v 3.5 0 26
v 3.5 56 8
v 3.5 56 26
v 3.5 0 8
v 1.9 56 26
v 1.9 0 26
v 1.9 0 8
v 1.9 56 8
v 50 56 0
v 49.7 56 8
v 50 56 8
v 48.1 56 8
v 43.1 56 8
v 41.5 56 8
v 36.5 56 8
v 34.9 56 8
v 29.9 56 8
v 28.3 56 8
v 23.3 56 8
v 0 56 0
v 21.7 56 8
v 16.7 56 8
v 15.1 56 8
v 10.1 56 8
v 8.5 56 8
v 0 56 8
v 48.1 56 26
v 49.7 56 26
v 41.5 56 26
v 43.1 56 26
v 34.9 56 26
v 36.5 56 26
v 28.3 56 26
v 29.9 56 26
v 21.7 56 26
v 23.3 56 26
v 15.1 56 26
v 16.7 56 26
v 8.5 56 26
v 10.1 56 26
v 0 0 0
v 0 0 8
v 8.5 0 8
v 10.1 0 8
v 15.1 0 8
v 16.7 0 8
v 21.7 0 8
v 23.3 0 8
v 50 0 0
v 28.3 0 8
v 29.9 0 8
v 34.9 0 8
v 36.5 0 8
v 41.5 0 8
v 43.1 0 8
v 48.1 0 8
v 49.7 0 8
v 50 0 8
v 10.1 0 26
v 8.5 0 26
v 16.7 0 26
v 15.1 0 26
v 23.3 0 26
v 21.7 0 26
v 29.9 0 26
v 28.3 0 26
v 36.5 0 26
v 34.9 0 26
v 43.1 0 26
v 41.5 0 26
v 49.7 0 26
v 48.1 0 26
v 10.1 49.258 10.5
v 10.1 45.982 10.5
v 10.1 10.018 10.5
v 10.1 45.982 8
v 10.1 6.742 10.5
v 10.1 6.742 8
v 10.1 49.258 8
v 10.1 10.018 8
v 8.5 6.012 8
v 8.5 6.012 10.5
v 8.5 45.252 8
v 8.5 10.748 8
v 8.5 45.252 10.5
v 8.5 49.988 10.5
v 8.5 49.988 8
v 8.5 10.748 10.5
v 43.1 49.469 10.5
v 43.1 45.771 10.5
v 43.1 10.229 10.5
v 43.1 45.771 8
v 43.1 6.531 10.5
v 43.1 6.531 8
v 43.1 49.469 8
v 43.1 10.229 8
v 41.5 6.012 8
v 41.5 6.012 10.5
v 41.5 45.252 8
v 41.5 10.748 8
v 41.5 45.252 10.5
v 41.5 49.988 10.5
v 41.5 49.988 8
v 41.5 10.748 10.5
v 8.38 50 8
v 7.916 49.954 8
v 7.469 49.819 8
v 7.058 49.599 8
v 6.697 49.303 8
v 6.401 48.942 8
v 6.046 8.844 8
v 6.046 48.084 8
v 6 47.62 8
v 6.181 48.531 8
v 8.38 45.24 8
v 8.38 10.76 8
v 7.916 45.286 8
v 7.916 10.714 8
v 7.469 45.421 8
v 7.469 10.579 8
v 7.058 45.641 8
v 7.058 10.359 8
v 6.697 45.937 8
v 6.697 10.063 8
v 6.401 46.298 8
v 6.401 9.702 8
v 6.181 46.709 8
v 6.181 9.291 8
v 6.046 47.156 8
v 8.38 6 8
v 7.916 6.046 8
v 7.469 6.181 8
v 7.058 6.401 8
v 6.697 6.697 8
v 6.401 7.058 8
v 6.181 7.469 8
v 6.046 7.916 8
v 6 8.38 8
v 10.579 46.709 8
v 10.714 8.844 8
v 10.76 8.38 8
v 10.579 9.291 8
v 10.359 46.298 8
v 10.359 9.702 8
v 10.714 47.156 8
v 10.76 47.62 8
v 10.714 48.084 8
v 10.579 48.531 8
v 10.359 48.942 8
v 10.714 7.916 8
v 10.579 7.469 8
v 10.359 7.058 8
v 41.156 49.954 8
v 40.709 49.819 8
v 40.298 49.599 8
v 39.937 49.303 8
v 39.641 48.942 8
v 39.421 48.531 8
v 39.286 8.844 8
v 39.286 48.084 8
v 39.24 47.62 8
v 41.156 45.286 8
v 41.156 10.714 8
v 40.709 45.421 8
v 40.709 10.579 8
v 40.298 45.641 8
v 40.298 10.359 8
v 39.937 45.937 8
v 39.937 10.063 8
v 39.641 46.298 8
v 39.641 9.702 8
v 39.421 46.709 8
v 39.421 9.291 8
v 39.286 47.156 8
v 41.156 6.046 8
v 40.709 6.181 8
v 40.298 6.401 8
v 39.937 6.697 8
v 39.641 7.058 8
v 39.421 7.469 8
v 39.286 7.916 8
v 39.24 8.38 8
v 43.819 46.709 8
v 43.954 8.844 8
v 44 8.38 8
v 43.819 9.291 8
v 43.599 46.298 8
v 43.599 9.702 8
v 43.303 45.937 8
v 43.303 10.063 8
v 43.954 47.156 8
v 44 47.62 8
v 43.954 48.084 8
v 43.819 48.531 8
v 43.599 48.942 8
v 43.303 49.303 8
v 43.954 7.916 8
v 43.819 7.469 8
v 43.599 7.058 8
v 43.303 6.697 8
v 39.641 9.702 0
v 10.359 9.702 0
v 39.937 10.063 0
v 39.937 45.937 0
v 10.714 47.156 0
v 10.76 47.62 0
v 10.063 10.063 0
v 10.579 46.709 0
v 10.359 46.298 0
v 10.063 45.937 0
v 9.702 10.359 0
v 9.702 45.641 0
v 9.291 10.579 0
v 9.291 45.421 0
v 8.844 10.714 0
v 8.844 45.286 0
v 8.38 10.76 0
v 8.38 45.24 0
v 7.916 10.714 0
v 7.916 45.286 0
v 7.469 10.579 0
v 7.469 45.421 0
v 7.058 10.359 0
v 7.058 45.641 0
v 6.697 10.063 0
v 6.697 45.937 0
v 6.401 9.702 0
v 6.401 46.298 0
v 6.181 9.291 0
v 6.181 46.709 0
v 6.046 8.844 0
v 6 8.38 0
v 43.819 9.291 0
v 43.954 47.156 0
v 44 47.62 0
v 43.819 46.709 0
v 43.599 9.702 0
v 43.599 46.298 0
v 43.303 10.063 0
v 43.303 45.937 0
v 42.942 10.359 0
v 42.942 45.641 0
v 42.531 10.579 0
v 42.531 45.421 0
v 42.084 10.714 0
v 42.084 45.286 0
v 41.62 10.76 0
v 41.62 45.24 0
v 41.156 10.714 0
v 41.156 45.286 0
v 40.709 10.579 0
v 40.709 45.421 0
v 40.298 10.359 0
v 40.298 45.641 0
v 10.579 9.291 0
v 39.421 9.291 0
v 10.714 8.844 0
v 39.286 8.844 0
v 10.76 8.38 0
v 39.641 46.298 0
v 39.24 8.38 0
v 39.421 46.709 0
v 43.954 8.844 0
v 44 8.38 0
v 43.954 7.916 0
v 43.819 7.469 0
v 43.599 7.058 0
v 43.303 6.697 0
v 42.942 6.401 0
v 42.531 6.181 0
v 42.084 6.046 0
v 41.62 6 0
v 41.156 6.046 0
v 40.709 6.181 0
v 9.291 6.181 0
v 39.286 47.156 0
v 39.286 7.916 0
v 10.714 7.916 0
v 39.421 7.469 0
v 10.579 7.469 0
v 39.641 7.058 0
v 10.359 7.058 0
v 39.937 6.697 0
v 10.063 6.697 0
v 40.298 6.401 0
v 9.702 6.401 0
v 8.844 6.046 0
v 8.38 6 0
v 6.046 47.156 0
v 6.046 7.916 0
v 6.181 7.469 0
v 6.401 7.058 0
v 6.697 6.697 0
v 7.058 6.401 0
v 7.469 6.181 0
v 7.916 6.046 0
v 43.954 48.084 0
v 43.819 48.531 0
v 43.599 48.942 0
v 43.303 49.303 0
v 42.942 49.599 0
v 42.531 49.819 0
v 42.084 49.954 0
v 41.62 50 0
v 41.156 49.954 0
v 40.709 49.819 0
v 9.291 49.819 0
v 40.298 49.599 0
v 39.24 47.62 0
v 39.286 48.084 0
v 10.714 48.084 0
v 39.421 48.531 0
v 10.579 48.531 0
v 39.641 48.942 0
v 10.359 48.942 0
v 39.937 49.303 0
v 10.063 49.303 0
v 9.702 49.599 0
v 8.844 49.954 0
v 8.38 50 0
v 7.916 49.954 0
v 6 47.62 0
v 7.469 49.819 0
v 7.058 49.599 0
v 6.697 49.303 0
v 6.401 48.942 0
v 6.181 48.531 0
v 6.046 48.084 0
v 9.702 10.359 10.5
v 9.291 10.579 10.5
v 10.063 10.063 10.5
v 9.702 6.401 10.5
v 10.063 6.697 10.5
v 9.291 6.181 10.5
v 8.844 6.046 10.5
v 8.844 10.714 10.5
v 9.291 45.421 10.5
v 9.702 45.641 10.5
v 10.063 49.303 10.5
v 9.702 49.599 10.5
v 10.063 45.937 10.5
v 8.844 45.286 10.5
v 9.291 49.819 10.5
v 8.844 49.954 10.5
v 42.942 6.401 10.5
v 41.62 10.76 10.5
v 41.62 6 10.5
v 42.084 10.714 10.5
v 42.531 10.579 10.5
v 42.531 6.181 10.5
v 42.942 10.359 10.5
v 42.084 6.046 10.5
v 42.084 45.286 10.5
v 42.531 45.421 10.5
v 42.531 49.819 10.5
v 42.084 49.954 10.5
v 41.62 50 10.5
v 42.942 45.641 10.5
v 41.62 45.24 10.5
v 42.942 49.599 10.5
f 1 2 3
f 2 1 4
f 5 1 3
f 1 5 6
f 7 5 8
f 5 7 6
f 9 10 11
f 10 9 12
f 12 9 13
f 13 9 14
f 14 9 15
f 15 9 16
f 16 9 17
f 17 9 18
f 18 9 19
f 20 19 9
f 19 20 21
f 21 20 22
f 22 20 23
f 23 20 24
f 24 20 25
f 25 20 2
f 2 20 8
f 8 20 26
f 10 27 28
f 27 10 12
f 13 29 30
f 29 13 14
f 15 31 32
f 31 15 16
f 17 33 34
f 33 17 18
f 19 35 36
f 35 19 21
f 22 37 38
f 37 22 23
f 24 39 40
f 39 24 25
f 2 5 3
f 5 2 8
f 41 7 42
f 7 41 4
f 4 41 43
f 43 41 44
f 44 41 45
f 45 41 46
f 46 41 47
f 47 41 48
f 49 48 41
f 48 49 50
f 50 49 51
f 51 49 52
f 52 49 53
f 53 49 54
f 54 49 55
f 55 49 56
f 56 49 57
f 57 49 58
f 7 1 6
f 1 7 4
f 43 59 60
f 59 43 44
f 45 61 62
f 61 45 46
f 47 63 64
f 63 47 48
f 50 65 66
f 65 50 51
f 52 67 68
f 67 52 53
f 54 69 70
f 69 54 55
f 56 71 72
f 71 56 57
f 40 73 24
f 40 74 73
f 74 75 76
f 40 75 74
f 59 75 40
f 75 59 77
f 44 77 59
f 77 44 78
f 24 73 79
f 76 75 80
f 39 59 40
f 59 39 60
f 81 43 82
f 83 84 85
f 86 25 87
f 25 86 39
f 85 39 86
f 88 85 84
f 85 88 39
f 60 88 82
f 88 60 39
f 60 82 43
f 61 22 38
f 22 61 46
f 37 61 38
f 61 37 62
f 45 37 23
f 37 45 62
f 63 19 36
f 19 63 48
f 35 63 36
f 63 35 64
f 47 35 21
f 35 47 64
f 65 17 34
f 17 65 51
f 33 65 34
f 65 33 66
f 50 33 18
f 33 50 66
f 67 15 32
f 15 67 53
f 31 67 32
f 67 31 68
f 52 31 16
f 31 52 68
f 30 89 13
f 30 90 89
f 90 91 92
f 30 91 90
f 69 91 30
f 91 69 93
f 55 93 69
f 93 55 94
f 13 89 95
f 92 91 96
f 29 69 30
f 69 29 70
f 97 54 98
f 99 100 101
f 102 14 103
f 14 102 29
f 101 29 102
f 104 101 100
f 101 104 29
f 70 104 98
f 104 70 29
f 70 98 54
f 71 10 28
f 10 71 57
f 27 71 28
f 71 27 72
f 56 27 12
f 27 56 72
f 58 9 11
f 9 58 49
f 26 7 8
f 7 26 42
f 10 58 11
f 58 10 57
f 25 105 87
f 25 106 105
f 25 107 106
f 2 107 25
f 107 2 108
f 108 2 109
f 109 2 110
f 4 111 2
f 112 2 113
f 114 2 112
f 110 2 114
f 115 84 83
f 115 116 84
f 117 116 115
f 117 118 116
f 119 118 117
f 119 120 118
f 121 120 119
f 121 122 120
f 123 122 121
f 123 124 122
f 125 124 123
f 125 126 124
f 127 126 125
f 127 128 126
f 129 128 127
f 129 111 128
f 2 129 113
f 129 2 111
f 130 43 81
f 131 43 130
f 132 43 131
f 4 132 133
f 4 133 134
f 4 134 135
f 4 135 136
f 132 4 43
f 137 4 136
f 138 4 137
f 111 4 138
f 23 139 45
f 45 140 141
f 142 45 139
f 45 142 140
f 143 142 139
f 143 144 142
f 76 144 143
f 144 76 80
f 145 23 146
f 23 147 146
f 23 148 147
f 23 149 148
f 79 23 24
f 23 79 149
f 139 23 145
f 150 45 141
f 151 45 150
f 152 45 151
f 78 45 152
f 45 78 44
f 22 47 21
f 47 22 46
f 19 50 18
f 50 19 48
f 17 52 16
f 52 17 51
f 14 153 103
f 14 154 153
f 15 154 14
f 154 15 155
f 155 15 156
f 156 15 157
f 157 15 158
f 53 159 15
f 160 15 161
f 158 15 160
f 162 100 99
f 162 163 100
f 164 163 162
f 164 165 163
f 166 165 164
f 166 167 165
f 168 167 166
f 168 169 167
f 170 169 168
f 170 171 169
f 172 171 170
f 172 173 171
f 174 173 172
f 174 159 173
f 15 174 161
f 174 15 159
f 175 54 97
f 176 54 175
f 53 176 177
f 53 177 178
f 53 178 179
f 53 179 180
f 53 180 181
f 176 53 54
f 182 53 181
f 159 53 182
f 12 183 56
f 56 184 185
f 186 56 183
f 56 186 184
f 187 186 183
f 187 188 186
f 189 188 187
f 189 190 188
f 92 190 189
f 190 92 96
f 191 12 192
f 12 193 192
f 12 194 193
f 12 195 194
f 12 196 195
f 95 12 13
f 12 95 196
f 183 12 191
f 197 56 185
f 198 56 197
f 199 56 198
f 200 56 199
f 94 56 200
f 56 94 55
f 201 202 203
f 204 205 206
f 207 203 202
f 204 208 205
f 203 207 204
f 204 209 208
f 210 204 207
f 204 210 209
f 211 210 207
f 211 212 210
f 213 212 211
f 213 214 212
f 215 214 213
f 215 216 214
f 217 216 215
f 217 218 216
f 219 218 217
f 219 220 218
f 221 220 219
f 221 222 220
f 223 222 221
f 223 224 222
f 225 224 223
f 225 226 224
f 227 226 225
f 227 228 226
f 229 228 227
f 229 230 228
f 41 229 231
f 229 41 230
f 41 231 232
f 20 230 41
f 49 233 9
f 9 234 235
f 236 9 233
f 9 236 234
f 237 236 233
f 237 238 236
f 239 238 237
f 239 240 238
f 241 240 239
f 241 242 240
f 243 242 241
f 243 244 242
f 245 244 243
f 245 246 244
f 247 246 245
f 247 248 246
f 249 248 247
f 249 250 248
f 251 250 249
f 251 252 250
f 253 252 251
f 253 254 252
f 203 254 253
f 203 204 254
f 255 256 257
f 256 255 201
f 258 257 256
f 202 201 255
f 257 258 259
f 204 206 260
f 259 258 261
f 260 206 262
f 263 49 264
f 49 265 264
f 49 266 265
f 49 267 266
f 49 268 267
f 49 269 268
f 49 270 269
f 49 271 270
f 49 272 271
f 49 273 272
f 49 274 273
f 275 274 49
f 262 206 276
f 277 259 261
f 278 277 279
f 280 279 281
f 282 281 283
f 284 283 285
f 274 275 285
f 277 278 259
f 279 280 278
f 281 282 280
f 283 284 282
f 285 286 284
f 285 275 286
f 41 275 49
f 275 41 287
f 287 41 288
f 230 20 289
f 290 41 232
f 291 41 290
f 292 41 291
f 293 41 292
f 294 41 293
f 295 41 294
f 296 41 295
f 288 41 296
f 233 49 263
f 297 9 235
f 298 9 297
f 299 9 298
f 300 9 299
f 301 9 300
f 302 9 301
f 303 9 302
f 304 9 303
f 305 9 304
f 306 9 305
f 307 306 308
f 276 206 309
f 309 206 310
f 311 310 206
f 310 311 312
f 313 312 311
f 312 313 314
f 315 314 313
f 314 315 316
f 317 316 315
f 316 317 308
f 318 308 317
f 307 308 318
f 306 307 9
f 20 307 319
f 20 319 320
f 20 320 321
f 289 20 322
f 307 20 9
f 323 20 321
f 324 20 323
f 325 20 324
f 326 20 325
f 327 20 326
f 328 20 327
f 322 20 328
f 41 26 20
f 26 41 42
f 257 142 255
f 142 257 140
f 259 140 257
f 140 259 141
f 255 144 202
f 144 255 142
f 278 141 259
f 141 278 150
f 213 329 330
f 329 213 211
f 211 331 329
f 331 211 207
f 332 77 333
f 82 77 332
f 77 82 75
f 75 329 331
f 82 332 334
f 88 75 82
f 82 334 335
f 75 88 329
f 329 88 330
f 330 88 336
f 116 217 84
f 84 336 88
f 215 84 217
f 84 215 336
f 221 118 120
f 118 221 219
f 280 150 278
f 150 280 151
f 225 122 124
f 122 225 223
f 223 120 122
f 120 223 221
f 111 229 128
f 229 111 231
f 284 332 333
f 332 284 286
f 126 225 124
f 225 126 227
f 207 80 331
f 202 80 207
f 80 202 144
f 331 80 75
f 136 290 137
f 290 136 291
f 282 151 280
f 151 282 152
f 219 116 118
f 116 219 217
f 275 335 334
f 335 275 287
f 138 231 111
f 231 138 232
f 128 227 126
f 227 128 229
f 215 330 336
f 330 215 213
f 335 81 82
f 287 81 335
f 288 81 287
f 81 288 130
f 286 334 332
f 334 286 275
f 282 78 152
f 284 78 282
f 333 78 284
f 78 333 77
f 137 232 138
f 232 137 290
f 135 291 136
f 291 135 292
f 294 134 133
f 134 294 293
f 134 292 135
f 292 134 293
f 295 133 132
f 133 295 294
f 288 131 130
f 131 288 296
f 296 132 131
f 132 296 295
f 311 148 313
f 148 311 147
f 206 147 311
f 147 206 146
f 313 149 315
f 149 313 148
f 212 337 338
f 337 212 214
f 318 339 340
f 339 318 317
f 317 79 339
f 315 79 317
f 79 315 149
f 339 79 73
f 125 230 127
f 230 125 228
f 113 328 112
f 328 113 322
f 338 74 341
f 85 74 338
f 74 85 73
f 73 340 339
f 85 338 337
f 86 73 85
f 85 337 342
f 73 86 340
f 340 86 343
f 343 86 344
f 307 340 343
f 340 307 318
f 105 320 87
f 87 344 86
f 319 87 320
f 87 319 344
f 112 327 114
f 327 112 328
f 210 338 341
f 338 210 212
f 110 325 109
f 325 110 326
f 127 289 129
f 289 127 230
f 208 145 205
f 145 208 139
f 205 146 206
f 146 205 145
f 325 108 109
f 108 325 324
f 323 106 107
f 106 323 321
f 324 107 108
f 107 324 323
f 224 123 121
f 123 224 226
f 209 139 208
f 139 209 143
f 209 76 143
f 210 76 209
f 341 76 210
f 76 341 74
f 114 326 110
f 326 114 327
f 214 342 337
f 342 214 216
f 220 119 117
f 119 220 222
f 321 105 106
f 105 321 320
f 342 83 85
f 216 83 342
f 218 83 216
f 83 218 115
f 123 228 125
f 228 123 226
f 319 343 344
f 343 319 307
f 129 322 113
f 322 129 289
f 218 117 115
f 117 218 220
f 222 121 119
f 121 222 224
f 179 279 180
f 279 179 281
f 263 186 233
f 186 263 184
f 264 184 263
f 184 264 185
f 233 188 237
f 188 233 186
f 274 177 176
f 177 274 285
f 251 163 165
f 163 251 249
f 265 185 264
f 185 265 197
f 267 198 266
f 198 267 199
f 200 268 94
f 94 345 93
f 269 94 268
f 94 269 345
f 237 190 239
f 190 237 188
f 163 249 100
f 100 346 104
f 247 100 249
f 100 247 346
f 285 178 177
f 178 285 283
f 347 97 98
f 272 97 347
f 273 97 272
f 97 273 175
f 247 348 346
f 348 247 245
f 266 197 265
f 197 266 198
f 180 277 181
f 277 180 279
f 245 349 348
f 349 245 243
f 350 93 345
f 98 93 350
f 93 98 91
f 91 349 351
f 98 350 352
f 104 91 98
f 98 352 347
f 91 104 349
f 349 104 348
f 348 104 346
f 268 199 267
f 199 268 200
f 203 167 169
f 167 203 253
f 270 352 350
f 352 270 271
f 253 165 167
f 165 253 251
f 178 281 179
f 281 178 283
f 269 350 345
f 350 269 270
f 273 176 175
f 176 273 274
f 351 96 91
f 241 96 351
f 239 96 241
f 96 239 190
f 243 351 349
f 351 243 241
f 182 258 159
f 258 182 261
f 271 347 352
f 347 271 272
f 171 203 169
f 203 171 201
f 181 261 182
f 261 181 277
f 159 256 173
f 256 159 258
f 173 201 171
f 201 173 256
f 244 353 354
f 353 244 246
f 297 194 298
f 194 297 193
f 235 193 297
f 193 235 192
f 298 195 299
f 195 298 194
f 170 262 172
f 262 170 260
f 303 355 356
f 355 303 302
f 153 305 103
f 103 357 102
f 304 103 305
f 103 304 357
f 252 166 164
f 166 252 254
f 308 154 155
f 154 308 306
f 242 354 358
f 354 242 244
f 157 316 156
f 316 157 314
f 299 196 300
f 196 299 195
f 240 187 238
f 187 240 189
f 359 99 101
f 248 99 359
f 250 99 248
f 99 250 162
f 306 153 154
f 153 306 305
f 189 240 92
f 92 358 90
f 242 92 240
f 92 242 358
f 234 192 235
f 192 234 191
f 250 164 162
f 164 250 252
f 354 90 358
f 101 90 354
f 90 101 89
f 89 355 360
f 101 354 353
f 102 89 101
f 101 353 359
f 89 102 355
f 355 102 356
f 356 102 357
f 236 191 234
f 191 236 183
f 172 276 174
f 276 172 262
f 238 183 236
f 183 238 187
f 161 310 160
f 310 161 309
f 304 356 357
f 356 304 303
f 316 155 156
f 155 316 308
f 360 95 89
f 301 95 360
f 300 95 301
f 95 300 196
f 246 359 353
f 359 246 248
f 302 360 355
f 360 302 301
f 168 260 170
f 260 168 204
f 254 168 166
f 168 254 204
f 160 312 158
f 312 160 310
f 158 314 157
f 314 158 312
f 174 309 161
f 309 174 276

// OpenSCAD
$fn = 32;

// ----------------------------------------------------------------------
// Finned heat sink: 50 x 56 mm base, 18 mm fins
// ----------------------------------------------------------------------

// --- parameters (mm) ---
base_w = 50;              // base width
base_d = 56;              // base depth
base_t = 8;               // base thickness
fin_h = 18;               // fin height above the base
holes_d = 4.76;           // fixing holes
hole_x = 16.62;           // hole offset in x
hole_y = 19.62;           // hole offset in y
fin_t = 1.6;              // fin thickness
fin_pitch = 6.6;          // fin pitch
fin_count = 8;            // number of fins
fin_x0 = 1.9;             // first fin offset

difference() {
  union() {
    cube([base_w, base_d, base_t]);
    for (i = [0 : fin_count - 1]) {
      translate([fin_x0 + i * fin_pitch, 0, base_t - 0.5]) cube([fin_t, base_d, fin_h + 0.5]);
    }
  }
  /* fixing holes through the base, 2.5 mm clear on both sides */
  for (hx = [-16.62, 16.62]) {
    for (hy = [-19.62, 19.62]) {
      translate([base_w / 2 + hx, base_d / 2 + hy, -2.5]) cylinder(h = base_t + 5, d = holes_d);
    }
  }
}
